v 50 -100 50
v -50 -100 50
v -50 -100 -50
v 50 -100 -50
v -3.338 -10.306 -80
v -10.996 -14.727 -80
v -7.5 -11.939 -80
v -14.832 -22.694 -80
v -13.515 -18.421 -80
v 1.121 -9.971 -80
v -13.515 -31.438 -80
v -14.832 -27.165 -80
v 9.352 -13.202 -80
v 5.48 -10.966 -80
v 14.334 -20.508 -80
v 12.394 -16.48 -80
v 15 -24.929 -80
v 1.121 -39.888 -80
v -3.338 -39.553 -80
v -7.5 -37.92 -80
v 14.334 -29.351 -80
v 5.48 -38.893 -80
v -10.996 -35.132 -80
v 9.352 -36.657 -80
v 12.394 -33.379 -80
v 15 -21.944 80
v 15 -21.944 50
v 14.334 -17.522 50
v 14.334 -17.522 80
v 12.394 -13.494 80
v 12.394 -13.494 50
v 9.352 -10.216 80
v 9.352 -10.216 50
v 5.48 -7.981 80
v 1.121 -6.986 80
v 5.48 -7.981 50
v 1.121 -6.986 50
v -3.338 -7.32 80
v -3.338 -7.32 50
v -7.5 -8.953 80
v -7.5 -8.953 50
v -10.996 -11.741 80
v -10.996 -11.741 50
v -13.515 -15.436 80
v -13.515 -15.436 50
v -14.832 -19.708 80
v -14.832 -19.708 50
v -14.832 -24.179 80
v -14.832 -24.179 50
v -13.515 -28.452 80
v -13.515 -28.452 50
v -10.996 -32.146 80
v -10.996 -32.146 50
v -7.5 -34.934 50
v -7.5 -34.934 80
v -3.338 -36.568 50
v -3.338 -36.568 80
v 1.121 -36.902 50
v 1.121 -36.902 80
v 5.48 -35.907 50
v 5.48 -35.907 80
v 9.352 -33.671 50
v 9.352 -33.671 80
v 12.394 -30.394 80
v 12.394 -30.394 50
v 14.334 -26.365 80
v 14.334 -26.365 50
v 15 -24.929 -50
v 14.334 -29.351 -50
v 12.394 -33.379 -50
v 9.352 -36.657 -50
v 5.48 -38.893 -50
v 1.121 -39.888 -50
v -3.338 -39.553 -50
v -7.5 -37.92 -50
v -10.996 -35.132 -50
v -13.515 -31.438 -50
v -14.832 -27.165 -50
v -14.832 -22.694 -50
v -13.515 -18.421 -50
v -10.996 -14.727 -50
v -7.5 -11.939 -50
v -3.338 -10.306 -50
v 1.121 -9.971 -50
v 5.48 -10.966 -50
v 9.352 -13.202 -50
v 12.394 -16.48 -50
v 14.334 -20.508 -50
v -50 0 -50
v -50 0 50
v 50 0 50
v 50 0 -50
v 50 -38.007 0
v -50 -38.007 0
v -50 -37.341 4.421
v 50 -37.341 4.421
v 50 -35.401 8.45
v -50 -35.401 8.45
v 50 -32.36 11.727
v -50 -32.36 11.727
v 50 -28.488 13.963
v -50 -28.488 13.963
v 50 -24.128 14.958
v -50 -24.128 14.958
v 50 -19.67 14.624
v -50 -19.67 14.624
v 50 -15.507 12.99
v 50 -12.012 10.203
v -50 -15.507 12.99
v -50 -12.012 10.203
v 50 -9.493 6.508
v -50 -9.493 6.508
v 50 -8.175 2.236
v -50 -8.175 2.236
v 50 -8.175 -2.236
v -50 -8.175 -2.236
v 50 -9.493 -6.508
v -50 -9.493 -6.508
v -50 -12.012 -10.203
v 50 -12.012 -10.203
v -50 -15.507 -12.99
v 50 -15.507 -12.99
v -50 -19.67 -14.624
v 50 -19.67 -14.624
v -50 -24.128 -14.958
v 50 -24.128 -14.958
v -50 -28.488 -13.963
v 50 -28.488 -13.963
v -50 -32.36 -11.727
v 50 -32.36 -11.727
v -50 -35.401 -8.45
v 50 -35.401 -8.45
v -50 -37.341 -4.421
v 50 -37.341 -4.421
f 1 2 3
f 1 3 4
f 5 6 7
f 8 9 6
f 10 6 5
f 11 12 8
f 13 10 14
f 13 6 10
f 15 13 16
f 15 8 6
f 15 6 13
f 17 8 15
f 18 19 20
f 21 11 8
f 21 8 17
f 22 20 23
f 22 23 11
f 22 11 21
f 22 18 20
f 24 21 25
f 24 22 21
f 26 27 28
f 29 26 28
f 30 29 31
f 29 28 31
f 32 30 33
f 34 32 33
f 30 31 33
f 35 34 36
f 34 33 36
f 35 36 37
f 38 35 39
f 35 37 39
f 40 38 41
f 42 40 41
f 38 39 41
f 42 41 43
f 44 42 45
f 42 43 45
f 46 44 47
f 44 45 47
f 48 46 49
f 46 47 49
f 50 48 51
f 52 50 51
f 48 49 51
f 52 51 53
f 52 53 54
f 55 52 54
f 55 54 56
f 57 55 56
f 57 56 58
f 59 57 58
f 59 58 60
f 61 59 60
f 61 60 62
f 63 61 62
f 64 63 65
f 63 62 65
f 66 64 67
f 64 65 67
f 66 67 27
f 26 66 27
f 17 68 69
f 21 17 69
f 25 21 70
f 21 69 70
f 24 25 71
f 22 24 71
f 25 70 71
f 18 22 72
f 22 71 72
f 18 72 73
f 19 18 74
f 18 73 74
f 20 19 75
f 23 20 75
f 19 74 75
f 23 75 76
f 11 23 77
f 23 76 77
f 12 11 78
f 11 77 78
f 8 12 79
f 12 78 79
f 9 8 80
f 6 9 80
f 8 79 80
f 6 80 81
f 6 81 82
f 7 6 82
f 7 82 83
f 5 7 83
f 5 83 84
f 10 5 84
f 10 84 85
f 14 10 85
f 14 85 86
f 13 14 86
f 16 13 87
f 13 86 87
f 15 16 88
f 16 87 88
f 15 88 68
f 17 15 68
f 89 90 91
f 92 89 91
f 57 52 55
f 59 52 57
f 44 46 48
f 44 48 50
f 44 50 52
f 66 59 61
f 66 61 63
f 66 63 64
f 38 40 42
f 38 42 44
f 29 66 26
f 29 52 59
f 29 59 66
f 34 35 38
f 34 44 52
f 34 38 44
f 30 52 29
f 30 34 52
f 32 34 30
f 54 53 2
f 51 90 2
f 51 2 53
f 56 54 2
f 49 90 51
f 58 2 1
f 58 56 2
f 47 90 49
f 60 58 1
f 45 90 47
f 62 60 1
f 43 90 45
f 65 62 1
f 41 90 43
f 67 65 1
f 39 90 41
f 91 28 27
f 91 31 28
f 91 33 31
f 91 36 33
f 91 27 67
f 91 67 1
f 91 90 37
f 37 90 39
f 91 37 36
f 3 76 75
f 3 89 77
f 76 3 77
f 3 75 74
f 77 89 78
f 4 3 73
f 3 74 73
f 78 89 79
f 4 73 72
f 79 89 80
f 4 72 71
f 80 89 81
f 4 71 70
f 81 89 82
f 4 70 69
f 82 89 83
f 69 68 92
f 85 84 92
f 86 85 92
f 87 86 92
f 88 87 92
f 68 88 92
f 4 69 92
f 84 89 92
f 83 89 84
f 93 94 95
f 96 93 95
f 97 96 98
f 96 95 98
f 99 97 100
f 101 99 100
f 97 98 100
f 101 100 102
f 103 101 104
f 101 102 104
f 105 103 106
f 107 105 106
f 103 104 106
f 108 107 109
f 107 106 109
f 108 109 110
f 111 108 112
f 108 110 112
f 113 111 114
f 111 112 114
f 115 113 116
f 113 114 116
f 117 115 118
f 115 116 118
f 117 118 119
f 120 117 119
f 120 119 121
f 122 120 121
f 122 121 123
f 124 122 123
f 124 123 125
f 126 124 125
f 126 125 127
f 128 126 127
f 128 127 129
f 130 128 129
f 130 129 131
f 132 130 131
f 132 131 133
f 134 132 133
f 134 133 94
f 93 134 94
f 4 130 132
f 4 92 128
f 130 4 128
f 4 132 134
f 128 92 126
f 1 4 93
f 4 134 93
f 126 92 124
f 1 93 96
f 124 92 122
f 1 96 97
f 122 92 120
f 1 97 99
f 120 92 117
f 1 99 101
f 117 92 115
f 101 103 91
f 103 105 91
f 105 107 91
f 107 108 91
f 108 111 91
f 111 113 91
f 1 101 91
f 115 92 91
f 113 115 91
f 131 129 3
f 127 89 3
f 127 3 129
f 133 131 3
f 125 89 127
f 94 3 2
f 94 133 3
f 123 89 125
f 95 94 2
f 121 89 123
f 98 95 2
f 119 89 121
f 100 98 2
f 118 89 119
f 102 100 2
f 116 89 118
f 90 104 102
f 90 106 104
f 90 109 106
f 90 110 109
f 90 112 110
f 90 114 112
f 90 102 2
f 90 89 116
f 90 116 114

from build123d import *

# Parameters (mm, degrees)
F0_W     = 100
F0_H     = 100
F1_DEPTH = 100
F2_R     = 15
F3_DEPTH = 30
F4_R     = 15
F5_DEPTH = 30
F7_D     = 30


with BuildPart() as f1:
    # F0 (on Front) → F1 (new body)
    with BuildSketch(Plane.XZ):
        Rectangle(F0_W, F0_H)
    extrude(amount=F1_DEPTH)

    # F2 (on face) → F3 (join)
    with BuildSketch(Plane.XY.offset(50)):
        with Locations((0, -21.943816)):
            Circle(F2_R)
    extrude(amount=F3_DEPTH)

    # F4 (on face) → F5 (join)
    with BuildSketch(Plane(origin=(0, 0, -50), x_dir=(1, 0, 0), z_dir=(0, 0, -1))):
        with Locations((0, 24.92946)):
            Circle(F4_R)
    extrude(amount=F5_DEPTH)

    # F7 (through all)
    with Locations(Plane.YZ.offset(50)):
        with Locations((-23.007467, 0)):
            Hole(F7_D / 2)


solid = f1.part
